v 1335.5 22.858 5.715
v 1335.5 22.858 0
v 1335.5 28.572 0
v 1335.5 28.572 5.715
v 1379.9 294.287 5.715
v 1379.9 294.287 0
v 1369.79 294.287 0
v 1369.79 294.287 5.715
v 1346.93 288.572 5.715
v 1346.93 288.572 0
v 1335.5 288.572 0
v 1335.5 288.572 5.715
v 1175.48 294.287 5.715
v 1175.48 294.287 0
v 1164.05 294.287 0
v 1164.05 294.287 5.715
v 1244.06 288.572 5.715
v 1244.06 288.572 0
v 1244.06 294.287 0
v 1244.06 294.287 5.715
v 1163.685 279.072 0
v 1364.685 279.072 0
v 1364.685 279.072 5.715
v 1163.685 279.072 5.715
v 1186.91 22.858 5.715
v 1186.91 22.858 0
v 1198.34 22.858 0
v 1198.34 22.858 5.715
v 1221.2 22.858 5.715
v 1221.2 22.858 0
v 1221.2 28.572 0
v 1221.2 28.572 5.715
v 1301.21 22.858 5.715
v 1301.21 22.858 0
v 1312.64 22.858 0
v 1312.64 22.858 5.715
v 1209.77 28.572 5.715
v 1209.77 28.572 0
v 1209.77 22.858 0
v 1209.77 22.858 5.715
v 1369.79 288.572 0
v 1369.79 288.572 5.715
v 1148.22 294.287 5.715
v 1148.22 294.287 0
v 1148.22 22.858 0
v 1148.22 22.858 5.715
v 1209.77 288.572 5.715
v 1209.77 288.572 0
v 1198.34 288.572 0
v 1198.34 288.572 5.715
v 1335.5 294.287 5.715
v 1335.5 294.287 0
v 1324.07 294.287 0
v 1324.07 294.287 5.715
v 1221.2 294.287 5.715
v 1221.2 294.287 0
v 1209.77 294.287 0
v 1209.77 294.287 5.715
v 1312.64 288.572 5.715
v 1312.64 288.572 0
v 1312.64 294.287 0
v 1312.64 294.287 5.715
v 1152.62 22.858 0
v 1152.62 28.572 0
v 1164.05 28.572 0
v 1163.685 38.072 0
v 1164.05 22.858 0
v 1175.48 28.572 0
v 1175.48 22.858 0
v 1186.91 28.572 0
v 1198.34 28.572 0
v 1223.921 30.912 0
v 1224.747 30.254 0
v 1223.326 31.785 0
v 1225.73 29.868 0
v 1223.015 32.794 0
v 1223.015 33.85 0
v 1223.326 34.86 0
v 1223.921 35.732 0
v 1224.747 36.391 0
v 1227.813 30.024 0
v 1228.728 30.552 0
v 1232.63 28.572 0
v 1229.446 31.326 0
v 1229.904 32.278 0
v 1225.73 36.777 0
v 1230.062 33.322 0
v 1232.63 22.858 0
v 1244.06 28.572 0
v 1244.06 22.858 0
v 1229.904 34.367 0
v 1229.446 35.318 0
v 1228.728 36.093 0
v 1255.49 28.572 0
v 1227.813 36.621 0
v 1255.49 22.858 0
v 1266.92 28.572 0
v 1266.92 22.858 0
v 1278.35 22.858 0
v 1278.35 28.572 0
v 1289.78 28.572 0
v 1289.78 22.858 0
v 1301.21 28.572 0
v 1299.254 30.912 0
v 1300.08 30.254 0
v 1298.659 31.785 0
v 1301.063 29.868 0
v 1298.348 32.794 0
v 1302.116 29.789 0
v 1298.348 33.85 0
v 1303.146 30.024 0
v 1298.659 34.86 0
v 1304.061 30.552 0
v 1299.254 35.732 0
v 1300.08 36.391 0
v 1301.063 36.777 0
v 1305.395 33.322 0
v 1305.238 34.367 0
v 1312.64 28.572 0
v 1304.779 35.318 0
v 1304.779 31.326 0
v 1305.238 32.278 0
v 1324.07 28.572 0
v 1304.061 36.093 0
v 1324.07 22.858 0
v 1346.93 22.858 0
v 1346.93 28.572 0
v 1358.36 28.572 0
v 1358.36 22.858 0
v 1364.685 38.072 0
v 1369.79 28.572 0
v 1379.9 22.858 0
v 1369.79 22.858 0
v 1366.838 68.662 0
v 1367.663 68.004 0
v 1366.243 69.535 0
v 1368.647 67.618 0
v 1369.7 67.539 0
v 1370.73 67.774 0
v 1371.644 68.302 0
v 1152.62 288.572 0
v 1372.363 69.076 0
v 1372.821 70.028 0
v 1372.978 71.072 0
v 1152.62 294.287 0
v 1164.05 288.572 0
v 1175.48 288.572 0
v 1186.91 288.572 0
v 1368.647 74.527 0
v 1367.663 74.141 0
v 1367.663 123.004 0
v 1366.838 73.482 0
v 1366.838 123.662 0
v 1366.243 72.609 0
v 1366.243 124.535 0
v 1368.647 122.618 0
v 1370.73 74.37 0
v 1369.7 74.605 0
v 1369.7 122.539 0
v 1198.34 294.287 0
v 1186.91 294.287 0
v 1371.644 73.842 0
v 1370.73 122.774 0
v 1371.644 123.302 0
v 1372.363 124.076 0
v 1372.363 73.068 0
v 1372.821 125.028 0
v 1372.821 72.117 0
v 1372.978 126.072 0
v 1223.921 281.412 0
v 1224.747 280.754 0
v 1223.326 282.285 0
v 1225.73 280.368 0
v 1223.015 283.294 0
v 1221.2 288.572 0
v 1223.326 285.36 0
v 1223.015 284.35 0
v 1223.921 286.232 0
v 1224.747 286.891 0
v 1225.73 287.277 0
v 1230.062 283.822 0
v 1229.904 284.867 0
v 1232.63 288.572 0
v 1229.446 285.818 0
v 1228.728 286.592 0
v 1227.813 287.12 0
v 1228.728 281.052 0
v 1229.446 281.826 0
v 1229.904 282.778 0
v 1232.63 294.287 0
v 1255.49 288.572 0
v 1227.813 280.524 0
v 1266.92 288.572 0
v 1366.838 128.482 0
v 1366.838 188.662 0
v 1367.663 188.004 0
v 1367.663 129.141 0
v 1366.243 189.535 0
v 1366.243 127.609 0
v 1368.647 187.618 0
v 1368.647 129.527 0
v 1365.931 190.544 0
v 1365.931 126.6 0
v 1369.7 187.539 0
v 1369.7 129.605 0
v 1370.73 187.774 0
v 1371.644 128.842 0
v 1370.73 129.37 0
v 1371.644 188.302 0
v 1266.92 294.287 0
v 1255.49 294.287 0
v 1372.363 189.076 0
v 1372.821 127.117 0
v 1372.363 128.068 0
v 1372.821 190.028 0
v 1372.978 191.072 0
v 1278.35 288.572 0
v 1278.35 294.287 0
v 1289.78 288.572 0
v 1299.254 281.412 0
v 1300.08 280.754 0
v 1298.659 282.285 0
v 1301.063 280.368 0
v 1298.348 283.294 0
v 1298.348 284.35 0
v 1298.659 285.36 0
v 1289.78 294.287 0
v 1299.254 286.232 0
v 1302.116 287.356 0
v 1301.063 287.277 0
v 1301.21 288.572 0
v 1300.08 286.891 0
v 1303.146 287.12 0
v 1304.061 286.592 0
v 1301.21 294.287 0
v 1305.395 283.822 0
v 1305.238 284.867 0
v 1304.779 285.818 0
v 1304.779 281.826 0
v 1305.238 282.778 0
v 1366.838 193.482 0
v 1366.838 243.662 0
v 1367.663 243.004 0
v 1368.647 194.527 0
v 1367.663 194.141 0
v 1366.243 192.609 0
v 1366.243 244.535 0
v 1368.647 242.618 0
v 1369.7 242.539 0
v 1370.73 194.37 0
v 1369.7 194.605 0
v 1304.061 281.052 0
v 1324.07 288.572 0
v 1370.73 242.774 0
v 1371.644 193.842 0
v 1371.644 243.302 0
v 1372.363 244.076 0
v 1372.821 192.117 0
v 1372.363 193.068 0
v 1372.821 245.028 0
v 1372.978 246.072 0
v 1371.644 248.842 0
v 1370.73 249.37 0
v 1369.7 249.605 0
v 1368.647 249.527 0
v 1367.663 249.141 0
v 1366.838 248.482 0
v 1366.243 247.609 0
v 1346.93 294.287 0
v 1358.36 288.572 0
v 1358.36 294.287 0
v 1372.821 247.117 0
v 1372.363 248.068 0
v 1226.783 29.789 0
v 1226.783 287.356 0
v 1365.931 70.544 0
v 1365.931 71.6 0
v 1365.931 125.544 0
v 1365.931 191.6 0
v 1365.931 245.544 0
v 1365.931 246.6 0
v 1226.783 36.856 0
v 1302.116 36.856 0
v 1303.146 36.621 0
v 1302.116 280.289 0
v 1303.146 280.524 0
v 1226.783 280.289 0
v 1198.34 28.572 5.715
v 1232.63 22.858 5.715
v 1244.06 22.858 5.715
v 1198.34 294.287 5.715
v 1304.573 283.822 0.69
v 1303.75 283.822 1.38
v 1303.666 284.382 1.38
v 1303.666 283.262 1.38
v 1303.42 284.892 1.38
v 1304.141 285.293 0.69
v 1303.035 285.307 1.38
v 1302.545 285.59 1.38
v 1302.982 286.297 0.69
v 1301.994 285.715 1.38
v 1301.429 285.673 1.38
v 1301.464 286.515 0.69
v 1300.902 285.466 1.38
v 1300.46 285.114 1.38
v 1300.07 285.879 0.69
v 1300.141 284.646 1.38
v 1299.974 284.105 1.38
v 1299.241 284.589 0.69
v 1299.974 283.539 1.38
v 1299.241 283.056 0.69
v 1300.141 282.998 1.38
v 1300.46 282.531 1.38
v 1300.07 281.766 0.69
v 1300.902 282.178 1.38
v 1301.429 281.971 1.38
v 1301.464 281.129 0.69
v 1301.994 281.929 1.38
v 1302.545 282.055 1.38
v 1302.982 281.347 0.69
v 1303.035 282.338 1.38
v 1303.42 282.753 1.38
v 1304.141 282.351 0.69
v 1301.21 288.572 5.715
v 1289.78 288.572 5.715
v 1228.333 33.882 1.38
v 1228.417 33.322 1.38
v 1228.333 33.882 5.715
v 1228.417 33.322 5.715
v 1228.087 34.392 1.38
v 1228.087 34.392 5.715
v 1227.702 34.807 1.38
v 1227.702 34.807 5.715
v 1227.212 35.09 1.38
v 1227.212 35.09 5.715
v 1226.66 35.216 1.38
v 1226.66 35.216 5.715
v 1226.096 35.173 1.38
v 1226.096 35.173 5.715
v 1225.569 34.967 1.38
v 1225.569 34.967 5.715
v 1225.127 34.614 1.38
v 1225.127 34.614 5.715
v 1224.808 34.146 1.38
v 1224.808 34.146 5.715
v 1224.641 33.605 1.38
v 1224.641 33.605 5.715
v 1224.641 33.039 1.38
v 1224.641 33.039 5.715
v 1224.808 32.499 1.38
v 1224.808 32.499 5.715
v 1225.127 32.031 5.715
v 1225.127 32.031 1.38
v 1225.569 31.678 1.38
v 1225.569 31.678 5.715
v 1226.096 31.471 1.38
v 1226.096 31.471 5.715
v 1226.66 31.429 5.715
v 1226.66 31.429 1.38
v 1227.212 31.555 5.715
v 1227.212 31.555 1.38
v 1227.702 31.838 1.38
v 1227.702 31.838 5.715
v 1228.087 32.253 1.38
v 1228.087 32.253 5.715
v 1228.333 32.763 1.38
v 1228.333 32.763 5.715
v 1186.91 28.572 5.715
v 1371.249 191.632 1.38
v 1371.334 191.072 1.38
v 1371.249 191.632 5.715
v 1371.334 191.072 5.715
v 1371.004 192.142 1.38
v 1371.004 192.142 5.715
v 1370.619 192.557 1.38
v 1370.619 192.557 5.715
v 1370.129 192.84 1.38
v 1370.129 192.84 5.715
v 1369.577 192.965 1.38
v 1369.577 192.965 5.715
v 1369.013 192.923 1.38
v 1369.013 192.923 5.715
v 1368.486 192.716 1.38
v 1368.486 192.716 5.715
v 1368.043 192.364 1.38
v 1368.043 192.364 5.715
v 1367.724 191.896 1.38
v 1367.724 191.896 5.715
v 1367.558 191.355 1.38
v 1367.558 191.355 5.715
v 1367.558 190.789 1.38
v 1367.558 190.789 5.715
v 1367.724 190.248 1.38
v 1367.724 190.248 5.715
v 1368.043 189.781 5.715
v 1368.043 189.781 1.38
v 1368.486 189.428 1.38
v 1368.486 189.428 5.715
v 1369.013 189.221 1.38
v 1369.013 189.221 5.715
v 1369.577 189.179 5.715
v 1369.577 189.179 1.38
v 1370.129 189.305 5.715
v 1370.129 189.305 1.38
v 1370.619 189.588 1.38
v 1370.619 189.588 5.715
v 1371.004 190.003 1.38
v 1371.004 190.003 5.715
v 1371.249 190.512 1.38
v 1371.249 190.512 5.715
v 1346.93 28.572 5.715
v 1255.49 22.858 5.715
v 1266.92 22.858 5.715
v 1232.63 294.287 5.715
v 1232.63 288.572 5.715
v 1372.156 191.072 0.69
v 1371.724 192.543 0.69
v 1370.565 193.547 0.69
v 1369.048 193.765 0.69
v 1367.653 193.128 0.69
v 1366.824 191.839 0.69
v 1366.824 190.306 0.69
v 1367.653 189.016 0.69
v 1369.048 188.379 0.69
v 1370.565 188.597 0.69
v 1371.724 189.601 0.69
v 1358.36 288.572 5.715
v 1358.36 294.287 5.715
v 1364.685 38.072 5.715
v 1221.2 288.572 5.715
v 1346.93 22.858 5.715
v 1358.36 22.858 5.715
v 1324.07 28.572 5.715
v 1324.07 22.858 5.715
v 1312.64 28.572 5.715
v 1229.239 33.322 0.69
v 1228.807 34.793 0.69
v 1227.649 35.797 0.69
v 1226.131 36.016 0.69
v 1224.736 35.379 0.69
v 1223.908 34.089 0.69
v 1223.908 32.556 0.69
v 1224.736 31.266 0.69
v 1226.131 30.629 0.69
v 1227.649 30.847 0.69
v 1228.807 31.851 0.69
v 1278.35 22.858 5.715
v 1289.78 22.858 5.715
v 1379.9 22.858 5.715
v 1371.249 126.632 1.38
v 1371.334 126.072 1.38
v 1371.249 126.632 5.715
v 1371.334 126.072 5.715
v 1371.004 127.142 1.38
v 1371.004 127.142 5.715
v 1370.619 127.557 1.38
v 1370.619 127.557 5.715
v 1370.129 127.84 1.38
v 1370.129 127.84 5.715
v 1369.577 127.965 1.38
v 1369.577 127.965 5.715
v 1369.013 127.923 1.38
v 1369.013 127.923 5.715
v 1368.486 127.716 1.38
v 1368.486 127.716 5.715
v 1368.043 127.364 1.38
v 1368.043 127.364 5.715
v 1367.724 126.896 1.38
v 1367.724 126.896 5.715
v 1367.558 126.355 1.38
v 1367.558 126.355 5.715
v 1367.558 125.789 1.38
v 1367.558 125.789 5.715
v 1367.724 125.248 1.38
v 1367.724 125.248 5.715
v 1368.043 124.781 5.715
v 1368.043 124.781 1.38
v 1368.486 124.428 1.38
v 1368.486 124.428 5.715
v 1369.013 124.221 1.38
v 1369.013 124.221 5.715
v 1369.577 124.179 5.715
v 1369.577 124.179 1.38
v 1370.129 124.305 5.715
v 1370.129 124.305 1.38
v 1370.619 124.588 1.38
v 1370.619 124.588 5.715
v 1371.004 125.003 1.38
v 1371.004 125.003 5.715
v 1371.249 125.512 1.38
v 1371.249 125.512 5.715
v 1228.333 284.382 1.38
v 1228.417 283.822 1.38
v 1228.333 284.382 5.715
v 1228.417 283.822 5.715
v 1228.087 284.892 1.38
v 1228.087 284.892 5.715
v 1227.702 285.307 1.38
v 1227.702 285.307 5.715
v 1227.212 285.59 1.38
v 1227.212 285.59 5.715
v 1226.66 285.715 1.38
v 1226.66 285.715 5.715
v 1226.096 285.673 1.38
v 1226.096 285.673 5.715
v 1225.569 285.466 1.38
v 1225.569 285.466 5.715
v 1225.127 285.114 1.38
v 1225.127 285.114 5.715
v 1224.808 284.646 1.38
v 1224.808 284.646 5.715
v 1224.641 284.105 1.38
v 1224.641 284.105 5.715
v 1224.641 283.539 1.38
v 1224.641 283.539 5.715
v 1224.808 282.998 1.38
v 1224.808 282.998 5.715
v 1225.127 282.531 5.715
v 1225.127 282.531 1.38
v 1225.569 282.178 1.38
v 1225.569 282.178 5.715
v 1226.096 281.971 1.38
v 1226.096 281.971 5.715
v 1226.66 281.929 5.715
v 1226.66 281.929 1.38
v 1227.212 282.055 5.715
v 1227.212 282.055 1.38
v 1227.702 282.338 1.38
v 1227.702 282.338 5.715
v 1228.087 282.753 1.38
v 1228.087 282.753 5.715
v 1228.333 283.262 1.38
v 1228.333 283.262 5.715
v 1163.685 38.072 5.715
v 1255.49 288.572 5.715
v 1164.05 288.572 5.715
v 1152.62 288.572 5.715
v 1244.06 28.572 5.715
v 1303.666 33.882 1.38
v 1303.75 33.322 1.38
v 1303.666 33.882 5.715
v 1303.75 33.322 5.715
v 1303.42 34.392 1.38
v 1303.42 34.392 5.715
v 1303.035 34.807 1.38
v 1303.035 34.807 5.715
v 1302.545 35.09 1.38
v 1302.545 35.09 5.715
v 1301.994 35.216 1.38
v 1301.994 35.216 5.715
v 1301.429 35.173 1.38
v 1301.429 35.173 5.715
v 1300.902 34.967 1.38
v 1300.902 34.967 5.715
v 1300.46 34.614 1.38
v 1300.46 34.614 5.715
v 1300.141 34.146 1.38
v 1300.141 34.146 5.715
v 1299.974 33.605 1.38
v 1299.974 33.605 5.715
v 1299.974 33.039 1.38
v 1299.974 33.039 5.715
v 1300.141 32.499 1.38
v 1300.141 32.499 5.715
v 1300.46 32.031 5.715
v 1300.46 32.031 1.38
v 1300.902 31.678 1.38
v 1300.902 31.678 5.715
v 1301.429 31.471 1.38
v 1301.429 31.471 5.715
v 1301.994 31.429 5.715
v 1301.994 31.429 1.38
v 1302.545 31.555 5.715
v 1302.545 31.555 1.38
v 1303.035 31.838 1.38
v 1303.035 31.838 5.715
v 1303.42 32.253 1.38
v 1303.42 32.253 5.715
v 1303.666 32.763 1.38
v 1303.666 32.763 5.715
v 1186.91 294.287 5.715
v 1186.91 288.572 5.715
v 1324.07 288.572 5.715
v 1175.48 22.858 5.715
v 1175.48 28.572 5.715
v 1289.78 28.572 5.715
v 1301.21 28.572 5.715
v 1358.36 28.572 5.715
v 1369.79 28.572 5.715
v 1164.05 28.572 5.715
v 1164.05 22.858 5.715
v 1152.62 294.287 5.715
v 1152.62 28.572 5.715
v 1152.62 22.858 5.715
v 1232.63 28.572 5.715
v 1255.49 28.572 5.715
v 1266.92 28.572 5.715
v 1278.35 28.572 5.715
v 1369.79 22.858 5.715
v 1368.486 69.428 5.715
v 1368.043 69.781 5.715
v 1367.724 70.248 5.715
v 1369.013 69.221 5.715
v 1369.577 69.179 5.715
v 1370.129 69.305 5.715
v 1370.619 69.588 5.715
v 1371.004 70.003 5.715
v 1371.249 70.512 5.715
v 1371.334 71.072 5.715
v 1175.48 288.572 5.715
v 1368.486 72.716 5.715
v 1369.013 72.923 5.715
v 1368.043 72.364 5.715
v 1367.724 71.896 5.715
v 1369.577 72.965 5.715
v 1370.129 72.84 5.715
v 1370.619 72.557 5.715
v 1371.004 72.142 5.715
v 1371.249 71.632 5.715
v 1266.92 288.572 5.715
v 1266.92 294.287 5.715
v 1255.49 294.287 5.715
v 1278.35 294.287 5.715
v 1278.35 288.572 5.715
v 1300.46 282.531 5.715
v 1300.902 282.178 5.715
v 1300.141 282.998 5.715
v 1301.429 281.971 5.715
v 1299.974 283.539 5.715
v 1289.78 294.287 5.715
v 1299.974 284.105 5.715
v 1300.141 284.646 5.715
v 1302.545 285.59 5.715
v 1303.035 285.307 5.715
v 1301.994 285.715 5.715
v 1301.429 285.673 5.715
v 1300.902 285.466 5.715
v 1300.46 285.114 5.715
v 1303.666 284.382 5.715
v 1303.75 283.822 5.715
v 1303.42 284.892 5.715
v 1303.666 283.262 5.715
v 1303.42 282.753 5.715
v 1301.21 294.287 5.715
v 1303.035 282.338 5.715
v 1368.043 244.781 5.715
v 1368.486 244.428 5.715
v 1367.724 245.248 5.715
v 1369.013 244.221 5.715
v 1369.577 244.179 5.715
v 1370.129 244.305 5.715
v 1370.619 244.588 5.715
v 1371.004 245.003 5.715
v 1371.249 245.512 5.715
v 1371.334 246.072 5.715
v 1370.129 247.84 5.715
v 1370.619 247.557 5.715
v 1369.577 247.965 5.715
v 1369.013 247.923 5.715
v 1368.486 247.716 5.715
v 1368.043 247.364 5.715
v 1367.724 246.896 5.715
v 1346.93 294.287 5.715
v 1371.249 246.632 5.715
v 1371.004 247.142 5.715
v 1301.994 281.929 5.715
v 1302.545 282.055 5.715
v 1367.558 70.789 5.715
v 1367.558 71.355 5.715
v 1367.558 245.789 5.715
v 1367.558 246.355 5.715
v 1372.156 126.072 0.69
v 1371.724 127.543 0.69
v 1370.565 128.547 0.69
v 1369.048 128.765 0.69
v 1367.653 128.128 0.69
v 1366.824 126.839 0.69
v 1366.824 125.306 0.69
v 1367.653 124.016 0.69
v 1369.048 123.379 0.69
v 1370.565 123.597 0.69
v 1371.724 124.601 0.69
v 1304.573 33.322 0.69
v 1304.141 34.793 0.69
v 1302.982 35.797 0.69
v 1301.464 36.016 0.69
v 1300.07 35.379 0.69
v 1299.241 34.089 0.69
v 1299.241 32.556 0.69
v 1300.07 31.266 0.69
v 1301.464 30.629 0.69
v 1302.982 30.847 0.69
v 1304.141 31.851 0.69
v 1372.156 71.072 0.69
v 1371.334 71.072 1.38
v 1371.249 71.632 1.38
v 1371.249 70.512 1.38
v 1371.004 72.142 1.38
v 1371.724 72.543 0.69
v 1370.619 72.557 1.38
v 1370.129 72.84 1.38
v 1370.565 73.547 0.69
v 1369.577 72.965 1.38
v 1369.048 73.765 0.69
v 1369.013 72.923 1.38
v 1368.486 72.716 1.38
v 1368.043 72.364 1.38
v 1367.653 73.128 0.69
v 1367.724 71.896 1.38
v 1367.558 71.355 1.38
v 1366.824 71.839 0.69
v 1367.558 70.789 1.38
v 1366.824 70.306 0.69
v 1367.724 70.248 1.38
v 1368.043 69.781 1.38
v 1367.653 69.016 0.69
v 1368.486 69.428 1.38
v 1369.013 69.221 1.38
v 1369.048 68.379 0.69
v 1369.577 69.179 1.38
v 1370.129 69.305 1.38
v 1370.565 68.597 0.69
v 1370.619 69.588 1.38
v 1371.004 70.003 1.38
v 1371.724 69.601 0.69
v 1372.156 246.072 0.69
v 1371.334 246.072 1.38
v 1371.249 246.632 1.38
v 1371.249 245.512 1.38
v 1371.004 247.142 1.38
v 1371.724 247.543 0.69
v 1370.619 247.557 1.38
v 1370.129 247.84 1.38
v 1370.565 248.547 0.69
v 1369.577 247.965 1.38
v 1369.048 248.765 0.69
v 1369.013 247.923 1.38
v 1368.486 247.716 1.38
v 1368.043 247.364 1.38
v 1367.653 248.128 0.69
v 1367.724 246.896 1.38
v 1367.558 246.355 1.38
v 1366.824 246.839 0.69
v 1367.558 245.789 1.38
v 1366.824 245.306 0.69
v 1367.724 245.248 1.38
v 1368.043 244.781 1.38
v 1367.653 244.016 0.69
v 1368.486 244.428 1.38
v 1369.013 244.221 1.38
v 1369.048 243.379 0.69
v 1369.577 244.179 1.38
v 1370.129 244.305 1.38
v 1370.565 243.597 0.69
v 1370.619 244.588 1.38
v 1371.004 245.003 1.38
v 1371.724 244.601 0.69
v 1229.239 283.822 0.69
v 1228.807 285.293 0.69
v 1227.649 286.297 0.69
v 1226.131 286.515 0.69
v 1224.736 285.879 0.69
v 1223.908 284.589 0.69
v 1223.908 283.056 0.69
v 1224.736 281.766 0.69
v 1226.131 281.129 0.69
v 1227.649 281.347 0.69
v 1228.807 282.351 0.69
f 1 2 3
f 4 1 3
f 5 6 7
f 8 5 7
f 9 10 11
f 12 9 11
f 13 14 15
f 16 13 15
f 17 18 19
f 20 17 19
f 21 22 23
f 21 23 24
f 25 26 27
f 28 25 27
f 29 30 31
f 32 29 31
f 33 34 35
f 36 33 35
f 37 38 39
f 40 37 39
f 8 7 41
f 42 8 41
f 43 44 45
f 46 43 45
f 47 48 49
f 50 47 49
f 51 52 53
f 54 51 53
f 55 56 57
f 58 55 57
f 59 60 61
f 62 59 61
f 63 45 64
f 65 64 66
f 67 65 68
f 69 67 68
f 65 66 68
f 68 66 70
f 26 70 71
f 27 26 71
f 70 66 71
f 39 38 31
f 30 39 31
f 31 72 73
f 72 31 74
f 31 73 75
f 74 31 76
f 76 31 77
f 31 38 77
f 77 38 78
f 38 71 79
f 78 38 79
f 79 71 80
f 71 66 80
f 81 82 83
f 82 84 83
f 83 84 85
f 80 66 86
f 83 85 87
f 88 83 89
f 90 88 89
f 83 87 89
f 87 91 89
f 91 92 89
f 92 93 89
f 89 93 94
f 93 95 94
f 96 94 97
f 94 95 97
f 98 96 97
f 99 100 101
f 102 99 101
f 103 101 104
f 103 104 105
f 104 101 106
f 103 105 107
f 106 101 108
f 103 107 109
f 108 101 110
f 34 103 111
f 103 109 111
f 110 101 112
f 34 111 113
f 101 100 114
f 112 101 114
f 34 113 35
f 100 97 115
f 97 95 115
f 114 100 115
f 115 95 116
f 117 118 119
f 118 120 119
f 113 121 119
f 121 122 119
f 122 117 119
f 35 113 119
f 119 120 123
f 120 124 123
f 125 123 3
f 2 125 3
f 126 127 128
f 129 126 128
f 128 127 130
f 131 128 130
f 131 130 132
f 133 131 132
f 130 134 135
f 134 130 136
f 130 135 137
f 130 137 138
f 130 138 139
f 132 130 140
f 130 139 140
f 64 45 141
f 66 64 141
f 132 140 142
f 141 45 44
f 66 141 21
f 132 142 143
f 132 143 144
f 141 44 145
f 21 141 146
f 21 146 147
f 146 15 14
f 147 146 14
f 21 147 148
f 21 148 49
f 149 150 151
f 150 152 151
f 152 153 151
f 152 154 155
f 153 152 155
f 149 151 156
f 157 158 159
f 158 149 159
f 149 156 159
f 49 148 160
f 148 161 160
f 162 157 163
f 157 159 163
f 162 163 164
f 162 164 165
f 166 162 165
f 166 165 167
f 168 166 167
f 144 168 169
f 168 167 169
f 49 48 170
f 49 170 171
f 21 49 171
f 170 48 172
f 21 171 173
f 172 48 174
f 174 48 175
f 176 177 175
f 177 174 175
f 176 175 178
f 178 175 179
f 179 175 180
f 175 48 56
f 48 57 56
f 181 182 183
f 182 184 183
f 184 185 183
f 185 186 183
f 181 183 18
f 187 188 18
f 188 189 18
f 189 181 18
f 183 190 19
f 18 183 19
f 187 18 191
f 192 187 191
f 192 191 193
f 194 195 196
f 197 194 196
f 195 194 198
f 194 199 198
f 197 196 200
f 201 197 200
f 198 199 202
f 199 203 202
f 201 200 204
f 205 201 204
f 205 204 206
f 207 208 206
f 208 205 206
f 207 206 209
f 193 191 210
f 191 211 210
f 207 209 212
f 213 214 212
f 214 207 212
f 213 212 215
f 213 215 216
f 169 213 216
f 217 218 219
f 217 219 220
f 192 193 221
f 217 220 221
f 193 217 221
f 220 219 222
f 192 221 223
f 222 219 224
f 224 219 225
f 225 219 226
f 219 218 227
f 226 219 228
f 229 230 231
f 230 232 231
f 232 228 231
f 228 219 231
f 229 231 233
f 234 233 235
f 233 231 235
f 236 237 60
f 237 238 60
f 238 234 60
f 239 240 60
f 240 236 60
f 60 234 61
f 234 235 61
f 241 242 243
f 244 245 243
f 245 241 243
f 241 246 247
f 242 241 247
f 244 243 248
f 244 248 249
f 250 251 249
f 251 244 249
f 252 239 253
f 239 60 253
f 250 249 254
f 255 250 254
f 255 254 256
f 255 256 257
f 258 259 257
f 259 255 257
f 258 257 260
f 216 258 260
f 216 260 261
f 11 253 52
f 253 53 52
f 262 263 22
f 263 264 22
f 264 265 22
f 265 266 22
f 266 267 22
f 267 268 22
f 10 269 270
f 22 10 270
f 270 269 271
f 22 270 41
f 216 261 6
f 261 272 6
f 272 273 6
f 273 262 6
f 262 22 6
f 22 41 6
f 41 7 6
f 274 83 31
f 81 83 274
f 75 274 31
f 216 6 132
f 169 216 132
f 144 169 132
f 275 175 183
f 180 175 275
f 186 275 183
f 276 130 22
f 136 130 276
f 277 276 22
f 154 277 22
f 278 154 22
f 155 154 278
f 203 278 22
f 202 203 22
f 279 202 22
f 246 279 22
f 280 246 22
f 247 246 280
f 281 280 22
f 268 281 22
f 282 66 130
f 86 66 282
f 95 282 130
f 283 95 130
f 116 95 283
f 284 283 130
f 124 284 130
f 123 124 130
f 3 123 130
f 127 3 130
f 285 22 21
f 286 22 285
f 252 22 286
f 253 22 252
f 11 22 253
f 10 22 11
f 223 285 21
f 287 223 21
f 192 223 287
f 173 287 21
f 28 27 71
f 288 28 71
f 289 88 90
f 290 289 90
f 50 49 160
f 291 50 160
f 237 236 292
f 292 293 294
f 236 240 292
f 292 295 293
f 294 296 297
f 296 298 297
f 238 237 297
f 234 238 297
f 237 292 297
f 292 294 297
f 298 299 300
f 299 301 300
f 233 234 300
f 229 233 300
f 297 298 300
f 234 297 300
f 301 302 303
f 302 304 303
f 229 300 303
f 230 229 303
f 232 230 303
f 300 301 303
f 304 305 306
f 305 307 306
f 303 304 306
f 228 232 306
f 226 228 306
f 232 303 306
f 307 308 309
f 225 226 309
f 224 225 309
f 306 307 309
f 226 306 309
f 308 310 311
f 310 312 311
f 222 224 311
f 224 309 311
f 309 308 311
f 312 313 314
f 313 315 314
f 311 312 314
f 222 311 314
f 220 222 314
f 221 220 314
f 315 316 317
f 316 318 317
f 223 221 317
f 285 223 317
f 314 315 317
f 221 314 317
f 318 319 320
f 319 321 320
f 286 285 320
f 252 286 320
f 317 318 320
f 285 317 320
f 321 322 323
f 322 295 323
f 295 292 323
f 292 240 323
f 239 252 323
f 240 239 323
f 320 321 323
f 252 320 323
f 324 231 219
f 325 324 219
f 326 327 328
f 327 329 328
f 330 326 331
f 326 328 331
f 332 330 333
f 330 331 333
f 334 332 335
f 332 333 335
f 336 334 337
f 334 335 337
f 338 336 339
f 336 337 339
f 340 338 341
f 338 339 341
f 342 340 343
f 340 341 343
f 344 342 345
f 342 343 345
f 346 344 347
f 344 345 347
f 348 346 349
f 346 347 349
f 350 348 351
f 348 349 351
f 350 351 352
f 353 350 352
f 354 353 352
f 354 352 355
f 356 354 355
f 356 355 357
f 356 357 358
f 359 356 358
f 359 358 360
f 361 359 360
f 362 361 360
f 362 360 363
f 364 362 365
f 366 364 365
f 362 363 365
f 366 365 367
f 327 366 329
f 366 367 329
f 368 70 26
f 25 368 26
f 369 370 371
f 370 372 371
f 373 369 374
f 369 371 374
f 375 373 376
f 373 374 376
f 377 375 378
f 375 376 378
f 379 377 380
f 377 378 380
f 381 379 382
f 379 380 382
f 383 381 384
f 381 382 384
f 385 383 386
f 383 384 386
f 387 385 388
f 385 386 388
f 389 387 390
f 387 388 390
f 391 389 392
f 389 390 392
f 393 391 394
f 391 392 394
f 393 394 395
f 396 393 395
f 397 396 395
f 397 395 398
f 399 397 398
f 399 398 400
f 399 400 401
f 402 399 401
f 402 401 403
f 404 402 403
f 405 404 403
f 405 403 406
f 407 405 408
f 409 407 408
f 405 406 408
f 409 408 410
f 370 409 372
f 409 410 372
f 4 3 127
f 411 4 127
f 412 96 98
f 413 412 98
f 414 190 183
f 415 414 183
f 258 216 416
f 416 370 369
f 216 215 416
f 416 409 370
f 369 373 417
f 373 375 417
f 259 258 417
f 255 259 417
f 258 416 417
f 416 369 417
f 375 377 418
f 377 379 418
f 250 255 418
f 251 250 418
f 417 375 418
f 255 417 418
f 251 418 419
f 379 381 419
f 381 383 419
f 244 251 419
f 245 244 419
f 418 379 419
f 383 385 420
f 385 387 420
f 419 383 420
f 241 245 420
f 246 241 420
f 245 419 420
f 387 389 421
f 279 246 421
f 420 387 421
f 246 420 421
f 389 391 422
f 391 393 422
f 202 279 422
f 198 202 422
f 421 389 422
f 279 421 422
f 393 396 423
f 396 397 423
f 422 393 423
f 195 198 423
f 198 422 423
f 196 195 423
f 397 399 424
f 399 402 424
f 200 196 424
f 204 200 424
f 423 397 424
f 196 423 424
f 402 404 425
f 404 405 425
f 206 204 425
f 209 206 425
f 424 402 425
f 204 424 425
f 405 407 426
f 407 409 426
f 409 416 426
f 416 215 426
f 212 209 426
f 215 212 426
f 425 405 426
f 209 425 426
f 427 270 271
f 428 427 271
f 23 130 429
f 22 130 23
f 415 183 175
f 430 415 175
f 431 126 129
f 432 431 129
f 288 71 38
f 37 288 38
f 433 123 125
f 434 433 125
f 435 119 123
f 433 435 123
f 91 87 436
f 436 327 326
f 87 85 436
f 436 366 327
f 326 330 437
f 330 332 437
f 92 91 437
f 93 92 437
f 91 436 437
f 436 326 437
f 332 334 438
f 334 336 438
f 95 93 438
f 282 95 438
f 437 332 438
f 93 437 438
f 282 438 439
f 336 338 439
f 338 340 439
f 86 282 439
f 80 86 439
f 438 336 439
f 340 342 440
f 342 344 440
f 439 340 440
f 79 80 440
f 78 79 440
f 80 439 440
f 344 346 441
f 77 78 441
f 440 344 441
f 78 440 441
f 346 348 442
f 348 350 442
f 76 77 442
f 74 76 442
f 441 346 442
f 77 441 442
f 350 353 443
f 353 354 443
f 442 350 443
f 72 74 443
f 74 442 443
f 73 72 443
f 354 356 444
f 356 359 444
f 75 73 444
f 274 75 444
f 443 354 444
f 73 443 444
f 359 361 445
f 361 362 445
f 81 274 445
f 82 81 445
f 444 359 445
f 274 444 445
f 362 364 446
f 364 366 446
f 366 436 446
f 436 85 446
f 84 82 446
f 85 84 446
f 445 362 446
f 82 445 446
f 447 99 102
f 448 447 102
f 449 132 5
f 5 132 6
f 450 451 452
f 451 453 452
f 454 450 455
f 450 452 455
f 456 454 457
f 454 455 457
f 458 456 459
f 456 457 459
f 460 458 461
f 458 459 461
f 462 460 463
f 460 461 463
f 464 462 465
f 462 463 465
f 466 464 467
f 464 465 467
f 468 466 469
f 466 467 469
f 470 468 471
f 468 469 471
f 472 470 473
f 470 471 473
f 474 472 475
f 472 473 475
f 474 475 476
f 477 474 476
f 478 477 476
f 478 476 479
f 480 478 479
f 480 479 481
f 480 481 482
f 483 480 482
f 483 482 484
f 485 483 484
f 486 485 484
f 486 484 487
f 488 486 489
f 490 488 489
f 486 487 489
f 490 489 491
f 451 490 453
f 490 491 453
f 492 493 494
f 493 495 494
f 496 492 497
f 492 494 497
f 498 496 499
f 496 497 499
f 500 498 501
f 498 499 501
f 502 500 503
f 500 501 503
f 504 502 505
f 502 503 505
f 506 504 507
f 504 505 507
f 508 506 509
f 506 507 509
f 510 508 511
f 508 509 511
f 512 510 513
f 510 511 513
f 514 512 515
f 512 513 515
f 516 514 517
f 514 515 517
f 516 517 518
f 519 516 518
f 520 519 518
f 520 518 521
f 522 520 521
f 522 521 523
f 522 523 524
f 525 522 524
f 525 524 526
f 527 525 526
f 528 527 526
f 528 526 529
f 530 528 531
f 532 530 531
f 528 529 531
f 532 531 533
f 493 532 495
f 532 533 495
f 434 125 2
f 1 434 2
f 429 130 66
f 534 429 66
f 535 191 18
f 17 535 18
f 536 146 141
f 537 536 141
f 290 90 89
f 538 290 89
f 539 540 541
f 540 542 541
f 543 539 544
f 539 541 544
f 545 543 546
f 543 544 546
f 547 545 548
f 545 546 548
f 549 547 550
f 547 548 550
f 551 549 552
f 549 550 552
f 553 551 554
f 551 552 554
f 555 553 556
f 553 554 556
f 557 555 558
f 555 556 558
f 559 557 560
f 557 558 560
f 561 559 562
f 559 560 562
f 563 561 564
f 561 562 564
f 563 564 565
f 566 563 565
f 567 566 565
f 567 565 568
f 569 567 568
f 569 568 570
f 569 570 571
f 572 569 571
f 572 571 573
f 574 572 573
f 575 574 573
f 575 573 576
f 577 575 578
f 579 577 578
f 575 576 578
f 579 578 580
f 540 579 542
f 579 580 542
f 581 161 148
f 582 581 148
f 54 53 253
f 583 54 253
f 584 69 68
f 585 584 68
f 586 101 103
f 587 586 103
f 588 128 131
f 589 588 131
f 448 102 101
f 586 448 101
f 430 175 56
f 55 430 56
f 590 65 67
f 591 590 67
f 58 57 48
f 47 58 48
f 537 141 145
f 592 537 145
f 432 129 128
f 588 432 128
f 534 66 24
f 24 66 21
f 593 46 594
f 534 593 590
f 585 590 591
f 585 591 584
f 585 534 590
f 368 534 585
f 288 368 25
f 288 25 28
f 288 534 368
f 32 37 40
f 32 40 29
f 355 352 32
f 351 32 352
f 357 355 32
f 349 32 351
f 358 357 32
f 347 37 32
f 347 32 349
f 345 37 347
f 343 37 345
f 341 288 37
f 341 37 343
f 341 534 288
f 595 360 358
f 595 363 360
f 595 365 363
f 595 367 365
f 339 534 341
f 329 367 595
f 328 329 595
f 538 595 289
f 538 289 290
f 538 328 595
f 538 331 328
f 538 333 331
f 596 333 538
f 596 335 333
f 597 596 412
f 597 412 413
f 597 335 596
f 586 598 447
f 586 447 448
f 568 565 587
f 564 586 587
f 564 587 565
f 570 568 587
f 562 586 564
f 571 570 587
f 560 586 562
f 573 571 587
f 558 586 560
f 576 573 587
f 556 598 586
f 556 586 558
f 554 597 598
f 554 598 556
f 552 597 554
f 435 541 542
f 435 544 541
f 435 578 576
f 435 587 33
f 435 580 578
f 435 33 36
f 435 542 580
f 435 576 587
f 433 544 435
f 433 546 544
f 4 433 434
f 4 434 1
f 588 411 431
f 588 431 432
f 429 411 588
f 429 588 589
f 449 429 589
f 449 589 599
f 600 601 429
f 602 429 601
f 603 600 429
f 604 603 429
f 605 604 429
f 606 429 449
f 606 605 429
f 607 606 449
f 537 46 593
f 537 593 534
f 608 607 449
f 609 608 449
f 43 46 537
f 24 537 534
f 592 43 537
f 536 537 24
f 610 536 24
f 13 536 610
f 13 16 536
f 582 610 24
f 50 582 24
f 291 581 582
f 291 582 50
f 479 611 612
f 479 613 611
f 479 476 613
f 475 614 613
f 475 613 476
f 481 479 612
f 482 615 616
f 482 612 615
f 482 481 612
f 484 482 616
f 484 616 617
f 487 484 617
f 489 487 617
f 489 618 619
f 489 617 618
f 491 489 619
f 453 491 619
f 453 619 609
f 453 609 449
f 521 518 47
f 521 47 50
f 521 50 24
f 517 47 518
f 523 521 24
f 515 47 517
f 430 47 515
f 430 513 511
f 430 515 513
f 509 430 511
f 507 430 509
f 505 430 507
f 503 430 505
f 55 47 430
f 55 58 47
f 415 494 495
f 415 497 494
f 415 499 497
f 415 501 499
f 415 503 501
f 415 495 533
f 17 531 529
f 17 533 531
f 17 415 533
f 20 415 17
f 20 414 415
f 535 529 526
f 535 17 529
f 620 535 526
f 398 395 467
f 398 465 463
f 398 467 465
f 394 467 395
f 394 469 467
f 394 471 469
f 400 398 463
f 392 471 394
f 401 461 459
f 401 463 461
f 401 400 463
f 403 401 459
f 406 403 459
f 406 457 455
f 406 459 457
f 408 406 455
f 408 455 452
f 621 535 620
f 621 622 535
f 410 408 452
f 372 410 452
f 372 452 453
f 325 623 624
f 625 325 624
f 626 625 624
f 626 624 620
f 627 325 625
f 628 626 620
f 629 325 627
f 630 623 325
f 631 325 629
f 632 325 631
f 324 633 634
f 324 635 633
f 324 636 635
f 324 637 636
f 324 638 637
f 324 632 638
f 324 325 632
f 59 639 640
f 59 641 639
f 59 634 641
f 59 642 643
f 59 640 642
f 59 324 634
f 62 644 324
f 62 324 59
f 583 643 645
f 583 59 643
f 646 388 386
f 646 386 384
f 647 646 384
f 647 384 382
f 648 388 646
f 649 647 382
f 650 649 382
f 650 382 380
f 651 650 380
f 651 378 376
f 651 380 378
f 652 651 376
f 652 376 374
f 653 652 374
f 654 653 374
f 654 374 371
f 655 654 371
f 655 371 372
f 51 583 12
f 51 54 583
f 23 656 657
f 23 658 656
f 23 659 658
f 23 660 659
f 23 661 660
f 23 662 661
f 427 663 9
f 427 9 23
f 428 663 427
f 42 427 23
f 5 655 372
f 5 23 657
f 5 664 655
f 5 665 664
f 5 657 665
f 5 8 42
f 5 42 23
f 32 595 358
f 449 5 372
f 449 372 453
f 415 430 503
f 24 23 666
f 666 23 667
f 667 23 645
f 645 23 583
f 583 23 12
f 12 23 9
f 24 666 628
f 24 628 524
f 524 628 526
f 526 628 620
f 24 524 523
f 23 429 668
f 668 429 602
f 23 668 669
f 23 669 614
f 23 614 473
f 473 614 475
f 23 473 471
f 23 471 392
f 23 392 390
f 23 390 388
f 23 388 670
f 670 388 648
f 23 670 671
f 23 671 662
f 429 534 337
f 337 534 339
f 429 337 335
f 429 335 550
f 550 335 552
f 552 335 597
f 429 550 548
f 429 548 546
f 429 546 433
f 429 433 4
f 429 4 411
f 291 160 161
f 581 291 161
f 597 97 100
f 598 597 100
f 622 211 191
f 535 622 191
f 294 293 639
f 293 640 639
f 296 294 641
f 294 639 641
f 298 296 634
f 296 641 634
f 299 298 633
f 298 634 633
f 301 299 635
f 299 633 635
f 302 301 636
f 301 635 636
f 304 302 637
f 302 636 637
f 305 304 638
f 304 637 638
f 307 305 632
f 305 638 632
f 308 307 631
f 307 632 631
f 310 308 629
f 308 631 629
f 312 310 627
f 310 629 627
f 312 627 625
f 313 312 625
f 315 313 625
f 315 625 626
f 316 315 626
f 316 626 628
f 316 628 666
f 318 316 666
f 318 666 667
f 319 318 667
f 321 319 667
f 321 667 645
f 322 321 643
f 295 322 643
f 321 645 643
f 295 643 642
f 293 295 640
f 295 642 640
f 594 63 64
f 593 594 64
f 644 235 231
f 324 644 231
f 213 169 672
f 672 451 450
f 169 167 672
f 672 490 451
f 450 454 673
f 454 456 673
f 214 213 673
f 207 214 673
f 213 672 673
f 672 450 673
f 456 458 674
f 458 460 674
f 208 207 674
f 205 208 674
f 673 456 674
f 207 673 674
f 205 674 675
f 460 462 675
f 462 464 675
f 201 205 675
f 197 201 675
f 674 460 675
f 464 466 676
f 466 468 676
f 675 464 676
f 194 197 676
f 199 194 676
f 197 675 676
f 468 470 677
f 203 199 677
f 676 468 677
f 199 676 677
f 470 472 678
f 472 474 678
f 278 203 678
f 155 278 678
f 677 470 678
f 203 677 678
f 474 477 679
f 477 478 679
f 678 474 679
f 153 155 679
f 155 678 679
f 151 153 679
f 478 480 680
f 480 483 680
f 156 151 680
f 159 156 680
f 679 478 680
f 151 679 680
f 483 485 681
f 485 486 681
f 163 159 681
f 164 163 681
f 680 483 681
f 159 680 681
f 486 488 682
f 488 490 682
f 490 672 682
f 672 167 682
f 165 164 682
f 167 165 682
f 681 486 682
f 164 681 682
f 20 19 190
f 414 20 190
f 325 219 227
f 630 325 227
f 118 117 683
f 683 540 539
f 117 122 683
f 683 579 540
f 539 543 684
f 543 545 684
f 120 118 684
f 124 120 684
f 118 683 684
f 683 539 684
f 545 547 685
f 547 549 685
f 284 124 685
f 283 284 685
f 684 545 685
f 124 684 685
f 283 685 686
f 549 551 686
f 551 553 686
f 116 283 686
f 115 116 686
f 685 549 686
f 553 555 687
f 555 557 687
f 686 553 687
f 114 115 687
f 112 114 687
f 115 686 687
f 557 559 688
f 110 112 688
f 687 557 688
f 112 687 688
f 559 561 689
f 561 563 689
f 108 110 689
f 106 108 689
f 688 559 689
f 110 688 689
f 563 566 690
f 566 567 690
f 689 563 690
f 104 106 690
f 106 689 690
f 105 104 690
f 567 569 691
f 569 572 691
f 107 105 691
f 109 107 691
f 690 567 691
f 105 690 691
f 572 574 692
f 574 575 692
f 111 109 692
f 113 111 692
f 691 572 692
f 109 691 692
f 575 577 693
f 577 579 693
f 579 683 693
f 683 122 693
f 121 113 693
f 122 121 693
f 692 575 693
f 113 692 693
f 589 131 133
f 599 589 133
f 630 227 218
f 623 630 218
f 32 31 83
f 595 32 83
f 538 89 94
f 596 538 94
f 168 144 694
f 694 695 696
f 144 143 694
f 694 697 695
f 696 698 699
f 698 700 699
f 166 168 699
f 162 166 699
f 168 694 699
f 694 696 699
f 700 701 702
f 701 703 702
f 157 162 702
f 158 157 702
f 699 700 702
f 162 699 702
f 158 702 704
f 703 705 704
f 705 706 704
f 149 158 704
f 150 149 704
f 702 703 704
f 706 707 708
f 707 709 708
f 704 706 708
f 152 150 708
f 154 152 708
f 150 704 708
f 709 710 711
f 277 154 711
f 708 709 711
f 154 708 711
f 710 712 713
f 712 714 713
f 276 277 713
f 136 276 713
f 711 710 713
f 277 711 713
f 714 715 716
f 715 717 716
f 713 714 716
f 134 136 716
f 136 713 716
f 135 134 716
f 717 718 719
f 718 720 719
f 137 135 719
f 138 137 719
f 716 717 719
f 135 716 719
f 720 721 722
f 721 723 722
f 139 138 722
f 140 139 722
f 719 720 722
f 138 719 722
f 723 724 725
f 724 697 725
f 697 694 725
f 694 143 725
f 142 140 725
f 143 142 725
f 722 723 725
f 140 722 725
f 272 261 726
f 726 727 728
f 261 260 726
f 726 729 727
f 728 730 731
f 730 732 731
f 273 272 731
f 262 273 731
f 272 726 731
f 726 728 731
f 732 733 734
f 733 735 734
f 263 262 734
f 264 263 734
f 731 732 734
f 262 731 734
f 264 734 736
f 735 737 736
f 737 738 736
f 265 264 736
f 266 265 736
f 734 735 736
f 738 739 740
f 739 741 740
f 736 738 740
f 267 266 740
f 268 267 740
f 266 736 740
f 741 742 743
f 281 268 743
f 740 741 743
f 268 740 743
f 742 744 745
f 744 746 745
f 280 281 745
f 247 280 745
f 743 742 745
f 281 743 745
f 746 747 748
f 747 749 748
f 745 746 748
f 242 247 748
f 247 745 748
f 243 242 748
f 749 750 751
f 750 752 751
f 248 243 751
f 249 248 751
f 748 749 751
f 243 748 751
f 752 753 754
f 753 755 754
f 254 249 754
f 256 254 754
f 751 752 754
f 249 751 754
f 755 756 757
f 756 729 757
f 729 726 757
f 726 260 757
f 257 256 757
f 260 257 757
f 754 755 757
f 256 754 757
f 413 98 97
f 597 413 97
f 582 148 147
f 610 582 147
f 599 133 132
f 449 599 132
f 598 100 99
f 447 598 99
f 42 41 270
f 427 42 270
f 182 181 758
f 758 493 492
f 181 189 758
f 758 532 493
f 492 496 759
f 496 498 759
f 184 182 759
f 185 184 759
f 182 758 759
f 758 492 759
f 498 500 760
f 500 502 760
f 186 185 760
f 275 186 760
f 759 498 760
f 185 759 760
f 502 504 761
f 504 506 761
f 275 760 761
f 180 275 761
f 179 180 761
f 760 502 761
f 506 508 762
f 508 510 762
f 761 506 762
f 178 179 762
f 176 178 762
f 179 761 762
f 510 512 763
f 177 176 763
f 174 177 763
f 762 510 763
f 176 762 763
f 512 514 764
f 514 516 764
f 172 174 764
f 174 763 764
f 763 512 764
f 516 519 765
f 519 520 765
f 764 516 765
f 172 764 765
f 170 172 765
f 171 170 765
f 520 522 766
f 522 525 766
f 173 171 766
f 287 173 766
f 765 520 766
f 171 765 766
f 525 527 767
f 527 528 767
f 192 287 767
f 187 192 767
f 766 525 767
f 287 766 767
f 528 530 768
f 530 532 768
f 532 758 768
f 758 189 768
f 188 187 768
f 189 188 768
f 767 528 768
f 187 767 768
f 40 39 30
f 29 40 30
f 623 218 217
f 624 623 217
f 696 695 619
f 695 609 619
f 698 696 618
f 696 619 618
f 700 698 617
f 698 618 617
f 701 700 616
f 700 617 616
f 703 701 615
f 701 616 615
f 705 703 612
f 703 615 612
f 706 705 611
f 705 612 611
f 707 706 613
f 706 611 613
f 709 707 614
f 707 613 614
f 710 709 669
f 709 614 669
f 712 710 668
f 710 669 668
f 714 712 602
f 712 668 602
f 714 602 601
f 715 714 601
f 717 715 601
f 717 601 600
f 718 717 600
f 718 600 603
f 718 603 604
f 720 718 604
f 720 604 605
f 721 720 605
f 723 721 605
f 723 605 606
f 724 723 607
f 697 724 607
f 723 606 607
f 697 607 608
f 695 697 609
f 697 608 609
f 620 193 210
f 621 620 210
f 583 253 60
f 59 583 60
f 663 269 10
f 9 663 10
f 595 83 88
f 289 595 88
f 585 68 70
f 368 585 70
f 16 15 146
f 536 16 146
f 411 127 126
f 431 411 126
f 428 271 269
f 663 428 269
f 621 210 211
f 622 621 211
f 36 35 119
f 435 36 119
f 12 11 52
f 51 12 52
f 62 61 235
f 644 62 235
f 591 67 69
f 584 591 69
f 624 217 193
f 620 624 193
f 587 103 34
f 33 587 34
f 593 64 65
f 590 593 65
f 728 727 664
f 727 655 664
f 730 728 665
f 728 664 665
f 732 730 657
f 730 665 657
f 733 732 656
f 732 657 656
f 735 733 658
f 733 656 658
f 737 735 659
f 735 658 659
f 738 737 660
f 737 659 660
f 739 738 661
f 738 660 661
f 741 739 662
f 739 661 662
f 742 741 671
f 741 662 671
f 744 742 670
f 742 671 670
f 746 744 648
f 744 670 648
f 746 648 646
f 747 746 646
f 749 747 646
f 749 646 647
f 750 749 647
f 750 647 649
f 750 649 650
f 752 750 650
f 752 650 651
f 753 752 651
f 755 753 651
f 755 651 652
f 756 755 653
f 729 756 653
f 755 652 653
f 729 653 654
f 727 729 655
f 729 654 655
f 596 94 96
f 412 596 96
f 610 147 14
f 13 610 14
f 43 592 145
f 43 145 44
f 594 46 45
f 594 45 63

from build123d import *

# Parameters (mm, degrees)
BOSS_EXTRUDE1_DEPTH                               = 5.715
SKETCH1_W                                         = 201
SKETCH1_H                                         = 241
CUT_EXTRUDE1_DEPTH                                = 6.715
CSK_FOR_6_FLAT_HEAD_MACHINE_SCREW_100_D           = 3.7973
CSK_FOR_6_FLAT_HEAD_MACHINE_SCREW_100_CSINK_D     = 7.0866
CSK_FOR_6_FLAT_HEAD_MACHINE_SCREW_100_CSINK_ANGLE = 100
CSK_FOR_6_FLAT_HEAD_MACHINE_SCREW_2_D             = 3.7973
CSK_FOR_6_FLAT_HEAD_MACHINE_SCREW_2_CSINK_D       = 7.0866
CSK_FOR_6_FLAT_HEAD_MACHINE_SCREW_2_CSINK_ANGLE   = 100


with BuildPart() as part:
    # Model → Boss-Extrude1 (new body)
    with BuildSketch(Plane.XY):
        Polygon((1148.22, 22.8575), (1152.62, 22.8575), (1152.62, 28.5722), (1164.05, 28.5722), (1164.05, 22.8575), (1175.48, 22.8575), (1175.48, 28.5722), (1186.91, 28.5722), (1186.91, 22.8575), (1198.34, 22.8575), (1198.34, 28.5722), (1209.77, 28.5722), (1209.77, 22.8575), (1221.2, 22.8575), (1221.2, 28.5722), (1232.63, 28.5722), (1232.63, 22.8575), (1244.06, 22.8575), (1244.06, 28.5722), (1255.49, 28.5722), (1255.49, 22.8575), (1266.92, 22.8575), (1266.92, 28.5722), (1278.35, 28.5722), (1278.35, 22.8575), (1289.78, 22.8575), (1289.78, 28.5722), (1301.21, 28.5722), (1301.21, 22.8575), (1312.64, 22.8575), (1312.64, 28.5722), (1324.07, 28.5722), (1324.07, 22.8575), (1335.5, 22.8575), (1335.5, 28.5722), (1346.93, 28.5722), (1346.93, 22.8575), (1358.36, 22.8575), (1358.36, 28.5722), (1369.79, 28.5722), (1369.79, 22.8575), (1374.18, 22.8575), (1379.9, 22.8575), (1379.9, 28.5722), (1379.9, 288.572), (1379.9, 294.287), (1374.18, 294.287), (1369.79, 294.287), (1369.79, 288.572), (1358.36, 288.572), (1358.36, 294.287), (1346.93, 294.287), (1346.93, 288.572), (1335.5, 288.572), (1335.5, 294.287), (1324.07, 294.287), (1324.07, 288.572), (1312.64, 288.572), (1312.64, 294.287), (1301.21, 294.287), (1301.21, 288.572), (1289.78, 288.572), (1289.78, 294.287), (1278.35, 294.287), (1278.35, 288.572), (1266.92, 288.572), (1266.92, 294.287), (1255.49, 294.287), (1255.49, 288.572), (1244.06, 288.572), (1244.06, 294.287), (1232.63, 294.287), (1232.63, 288.572), (1221.2, 288.572), (1221.2, 294.287), (1209.77, 294.287), (1209.77, 288.572), (1198.34, 288.572), (1198.34, 294.287), (1186.91, 294.287), (1186.91, 288.572), (1175.48, 288.572), (1175.48, 294.287), (1164.05, 294.287), (1164.05, 288.572), (1152.62, 288.572), (1152.62, 294.287), (1148.22, 294.287), (1148.22, 288.572), (1148.22, 28.5722), align=None)
    extrude(amount=BOSS_EXTRUDE1_DEPTH)

    # Sketch1 → Cut-Extrude1 (cut, through all)
    with BuildSketch(Plane(origin=(0, 0, 0), x_dir=(-1, 0, 0), z_dir=(0, 0, -1))):
        with Locations((-1264.185, 158.57225)):
            Rectangle(SKETCH1_W, SKETCH1_H)
    extrude(amount=-CUT_EXTRUDE1_DEPTH, mode=Mode.SUBTRACT)

    # CSK for _6 Flat Head Machine Screw _100 (through all)
    with Locations(Plane(origin=(0, 0, 0), x_dir=(-1, 0, 0), z_dir=(0, 0, -1))):
        with Locations((-1301.85166666, 283.822125), (-1226.51833334, 283.822125), (-1226.51833334, 33.322375), (-1301.85166666, 33.322375)):
            CounterSinkHole(CSK_FOR_6_FLAT_HEAD_MACHINE_SCREW_100_D / 2, CSK_FOR_6_FLAT_HEAD_MACHINE_SCREW_100_CSINK_D / 2, counter_sink_angle=CSK_FOR_6_FLAT_HEAD_MACHINE_SCREW_100_CSINK_ANGLE)

    # CSK for _6 Flat Head Machine Screw _ 2 (through all)
    with Locations(Plane(origin=(0, 0, 0), x_dir=(-1, 0, 0), z_dir=(0, 0, -1))):
        with Locations((-1369.435, 246.0721), (-1369.435, 191.0721), (-1369.435, 126.0721), (-1369.435, 71.0721)):
            CounterSinkHole(CSK_FOR_6_FLAT_HEAD_MACHINE_SCREW_2_D / 2, CSK_FOR_6_FLAT_HEAD_MACHINE_SCREW_2_CSINK_D / 2, counter_sink_angle=CSK_FOR_6_FLAT_HEAD_MACHINE_SCREW_2_CSINK_ANGLE)


solid = part.part
